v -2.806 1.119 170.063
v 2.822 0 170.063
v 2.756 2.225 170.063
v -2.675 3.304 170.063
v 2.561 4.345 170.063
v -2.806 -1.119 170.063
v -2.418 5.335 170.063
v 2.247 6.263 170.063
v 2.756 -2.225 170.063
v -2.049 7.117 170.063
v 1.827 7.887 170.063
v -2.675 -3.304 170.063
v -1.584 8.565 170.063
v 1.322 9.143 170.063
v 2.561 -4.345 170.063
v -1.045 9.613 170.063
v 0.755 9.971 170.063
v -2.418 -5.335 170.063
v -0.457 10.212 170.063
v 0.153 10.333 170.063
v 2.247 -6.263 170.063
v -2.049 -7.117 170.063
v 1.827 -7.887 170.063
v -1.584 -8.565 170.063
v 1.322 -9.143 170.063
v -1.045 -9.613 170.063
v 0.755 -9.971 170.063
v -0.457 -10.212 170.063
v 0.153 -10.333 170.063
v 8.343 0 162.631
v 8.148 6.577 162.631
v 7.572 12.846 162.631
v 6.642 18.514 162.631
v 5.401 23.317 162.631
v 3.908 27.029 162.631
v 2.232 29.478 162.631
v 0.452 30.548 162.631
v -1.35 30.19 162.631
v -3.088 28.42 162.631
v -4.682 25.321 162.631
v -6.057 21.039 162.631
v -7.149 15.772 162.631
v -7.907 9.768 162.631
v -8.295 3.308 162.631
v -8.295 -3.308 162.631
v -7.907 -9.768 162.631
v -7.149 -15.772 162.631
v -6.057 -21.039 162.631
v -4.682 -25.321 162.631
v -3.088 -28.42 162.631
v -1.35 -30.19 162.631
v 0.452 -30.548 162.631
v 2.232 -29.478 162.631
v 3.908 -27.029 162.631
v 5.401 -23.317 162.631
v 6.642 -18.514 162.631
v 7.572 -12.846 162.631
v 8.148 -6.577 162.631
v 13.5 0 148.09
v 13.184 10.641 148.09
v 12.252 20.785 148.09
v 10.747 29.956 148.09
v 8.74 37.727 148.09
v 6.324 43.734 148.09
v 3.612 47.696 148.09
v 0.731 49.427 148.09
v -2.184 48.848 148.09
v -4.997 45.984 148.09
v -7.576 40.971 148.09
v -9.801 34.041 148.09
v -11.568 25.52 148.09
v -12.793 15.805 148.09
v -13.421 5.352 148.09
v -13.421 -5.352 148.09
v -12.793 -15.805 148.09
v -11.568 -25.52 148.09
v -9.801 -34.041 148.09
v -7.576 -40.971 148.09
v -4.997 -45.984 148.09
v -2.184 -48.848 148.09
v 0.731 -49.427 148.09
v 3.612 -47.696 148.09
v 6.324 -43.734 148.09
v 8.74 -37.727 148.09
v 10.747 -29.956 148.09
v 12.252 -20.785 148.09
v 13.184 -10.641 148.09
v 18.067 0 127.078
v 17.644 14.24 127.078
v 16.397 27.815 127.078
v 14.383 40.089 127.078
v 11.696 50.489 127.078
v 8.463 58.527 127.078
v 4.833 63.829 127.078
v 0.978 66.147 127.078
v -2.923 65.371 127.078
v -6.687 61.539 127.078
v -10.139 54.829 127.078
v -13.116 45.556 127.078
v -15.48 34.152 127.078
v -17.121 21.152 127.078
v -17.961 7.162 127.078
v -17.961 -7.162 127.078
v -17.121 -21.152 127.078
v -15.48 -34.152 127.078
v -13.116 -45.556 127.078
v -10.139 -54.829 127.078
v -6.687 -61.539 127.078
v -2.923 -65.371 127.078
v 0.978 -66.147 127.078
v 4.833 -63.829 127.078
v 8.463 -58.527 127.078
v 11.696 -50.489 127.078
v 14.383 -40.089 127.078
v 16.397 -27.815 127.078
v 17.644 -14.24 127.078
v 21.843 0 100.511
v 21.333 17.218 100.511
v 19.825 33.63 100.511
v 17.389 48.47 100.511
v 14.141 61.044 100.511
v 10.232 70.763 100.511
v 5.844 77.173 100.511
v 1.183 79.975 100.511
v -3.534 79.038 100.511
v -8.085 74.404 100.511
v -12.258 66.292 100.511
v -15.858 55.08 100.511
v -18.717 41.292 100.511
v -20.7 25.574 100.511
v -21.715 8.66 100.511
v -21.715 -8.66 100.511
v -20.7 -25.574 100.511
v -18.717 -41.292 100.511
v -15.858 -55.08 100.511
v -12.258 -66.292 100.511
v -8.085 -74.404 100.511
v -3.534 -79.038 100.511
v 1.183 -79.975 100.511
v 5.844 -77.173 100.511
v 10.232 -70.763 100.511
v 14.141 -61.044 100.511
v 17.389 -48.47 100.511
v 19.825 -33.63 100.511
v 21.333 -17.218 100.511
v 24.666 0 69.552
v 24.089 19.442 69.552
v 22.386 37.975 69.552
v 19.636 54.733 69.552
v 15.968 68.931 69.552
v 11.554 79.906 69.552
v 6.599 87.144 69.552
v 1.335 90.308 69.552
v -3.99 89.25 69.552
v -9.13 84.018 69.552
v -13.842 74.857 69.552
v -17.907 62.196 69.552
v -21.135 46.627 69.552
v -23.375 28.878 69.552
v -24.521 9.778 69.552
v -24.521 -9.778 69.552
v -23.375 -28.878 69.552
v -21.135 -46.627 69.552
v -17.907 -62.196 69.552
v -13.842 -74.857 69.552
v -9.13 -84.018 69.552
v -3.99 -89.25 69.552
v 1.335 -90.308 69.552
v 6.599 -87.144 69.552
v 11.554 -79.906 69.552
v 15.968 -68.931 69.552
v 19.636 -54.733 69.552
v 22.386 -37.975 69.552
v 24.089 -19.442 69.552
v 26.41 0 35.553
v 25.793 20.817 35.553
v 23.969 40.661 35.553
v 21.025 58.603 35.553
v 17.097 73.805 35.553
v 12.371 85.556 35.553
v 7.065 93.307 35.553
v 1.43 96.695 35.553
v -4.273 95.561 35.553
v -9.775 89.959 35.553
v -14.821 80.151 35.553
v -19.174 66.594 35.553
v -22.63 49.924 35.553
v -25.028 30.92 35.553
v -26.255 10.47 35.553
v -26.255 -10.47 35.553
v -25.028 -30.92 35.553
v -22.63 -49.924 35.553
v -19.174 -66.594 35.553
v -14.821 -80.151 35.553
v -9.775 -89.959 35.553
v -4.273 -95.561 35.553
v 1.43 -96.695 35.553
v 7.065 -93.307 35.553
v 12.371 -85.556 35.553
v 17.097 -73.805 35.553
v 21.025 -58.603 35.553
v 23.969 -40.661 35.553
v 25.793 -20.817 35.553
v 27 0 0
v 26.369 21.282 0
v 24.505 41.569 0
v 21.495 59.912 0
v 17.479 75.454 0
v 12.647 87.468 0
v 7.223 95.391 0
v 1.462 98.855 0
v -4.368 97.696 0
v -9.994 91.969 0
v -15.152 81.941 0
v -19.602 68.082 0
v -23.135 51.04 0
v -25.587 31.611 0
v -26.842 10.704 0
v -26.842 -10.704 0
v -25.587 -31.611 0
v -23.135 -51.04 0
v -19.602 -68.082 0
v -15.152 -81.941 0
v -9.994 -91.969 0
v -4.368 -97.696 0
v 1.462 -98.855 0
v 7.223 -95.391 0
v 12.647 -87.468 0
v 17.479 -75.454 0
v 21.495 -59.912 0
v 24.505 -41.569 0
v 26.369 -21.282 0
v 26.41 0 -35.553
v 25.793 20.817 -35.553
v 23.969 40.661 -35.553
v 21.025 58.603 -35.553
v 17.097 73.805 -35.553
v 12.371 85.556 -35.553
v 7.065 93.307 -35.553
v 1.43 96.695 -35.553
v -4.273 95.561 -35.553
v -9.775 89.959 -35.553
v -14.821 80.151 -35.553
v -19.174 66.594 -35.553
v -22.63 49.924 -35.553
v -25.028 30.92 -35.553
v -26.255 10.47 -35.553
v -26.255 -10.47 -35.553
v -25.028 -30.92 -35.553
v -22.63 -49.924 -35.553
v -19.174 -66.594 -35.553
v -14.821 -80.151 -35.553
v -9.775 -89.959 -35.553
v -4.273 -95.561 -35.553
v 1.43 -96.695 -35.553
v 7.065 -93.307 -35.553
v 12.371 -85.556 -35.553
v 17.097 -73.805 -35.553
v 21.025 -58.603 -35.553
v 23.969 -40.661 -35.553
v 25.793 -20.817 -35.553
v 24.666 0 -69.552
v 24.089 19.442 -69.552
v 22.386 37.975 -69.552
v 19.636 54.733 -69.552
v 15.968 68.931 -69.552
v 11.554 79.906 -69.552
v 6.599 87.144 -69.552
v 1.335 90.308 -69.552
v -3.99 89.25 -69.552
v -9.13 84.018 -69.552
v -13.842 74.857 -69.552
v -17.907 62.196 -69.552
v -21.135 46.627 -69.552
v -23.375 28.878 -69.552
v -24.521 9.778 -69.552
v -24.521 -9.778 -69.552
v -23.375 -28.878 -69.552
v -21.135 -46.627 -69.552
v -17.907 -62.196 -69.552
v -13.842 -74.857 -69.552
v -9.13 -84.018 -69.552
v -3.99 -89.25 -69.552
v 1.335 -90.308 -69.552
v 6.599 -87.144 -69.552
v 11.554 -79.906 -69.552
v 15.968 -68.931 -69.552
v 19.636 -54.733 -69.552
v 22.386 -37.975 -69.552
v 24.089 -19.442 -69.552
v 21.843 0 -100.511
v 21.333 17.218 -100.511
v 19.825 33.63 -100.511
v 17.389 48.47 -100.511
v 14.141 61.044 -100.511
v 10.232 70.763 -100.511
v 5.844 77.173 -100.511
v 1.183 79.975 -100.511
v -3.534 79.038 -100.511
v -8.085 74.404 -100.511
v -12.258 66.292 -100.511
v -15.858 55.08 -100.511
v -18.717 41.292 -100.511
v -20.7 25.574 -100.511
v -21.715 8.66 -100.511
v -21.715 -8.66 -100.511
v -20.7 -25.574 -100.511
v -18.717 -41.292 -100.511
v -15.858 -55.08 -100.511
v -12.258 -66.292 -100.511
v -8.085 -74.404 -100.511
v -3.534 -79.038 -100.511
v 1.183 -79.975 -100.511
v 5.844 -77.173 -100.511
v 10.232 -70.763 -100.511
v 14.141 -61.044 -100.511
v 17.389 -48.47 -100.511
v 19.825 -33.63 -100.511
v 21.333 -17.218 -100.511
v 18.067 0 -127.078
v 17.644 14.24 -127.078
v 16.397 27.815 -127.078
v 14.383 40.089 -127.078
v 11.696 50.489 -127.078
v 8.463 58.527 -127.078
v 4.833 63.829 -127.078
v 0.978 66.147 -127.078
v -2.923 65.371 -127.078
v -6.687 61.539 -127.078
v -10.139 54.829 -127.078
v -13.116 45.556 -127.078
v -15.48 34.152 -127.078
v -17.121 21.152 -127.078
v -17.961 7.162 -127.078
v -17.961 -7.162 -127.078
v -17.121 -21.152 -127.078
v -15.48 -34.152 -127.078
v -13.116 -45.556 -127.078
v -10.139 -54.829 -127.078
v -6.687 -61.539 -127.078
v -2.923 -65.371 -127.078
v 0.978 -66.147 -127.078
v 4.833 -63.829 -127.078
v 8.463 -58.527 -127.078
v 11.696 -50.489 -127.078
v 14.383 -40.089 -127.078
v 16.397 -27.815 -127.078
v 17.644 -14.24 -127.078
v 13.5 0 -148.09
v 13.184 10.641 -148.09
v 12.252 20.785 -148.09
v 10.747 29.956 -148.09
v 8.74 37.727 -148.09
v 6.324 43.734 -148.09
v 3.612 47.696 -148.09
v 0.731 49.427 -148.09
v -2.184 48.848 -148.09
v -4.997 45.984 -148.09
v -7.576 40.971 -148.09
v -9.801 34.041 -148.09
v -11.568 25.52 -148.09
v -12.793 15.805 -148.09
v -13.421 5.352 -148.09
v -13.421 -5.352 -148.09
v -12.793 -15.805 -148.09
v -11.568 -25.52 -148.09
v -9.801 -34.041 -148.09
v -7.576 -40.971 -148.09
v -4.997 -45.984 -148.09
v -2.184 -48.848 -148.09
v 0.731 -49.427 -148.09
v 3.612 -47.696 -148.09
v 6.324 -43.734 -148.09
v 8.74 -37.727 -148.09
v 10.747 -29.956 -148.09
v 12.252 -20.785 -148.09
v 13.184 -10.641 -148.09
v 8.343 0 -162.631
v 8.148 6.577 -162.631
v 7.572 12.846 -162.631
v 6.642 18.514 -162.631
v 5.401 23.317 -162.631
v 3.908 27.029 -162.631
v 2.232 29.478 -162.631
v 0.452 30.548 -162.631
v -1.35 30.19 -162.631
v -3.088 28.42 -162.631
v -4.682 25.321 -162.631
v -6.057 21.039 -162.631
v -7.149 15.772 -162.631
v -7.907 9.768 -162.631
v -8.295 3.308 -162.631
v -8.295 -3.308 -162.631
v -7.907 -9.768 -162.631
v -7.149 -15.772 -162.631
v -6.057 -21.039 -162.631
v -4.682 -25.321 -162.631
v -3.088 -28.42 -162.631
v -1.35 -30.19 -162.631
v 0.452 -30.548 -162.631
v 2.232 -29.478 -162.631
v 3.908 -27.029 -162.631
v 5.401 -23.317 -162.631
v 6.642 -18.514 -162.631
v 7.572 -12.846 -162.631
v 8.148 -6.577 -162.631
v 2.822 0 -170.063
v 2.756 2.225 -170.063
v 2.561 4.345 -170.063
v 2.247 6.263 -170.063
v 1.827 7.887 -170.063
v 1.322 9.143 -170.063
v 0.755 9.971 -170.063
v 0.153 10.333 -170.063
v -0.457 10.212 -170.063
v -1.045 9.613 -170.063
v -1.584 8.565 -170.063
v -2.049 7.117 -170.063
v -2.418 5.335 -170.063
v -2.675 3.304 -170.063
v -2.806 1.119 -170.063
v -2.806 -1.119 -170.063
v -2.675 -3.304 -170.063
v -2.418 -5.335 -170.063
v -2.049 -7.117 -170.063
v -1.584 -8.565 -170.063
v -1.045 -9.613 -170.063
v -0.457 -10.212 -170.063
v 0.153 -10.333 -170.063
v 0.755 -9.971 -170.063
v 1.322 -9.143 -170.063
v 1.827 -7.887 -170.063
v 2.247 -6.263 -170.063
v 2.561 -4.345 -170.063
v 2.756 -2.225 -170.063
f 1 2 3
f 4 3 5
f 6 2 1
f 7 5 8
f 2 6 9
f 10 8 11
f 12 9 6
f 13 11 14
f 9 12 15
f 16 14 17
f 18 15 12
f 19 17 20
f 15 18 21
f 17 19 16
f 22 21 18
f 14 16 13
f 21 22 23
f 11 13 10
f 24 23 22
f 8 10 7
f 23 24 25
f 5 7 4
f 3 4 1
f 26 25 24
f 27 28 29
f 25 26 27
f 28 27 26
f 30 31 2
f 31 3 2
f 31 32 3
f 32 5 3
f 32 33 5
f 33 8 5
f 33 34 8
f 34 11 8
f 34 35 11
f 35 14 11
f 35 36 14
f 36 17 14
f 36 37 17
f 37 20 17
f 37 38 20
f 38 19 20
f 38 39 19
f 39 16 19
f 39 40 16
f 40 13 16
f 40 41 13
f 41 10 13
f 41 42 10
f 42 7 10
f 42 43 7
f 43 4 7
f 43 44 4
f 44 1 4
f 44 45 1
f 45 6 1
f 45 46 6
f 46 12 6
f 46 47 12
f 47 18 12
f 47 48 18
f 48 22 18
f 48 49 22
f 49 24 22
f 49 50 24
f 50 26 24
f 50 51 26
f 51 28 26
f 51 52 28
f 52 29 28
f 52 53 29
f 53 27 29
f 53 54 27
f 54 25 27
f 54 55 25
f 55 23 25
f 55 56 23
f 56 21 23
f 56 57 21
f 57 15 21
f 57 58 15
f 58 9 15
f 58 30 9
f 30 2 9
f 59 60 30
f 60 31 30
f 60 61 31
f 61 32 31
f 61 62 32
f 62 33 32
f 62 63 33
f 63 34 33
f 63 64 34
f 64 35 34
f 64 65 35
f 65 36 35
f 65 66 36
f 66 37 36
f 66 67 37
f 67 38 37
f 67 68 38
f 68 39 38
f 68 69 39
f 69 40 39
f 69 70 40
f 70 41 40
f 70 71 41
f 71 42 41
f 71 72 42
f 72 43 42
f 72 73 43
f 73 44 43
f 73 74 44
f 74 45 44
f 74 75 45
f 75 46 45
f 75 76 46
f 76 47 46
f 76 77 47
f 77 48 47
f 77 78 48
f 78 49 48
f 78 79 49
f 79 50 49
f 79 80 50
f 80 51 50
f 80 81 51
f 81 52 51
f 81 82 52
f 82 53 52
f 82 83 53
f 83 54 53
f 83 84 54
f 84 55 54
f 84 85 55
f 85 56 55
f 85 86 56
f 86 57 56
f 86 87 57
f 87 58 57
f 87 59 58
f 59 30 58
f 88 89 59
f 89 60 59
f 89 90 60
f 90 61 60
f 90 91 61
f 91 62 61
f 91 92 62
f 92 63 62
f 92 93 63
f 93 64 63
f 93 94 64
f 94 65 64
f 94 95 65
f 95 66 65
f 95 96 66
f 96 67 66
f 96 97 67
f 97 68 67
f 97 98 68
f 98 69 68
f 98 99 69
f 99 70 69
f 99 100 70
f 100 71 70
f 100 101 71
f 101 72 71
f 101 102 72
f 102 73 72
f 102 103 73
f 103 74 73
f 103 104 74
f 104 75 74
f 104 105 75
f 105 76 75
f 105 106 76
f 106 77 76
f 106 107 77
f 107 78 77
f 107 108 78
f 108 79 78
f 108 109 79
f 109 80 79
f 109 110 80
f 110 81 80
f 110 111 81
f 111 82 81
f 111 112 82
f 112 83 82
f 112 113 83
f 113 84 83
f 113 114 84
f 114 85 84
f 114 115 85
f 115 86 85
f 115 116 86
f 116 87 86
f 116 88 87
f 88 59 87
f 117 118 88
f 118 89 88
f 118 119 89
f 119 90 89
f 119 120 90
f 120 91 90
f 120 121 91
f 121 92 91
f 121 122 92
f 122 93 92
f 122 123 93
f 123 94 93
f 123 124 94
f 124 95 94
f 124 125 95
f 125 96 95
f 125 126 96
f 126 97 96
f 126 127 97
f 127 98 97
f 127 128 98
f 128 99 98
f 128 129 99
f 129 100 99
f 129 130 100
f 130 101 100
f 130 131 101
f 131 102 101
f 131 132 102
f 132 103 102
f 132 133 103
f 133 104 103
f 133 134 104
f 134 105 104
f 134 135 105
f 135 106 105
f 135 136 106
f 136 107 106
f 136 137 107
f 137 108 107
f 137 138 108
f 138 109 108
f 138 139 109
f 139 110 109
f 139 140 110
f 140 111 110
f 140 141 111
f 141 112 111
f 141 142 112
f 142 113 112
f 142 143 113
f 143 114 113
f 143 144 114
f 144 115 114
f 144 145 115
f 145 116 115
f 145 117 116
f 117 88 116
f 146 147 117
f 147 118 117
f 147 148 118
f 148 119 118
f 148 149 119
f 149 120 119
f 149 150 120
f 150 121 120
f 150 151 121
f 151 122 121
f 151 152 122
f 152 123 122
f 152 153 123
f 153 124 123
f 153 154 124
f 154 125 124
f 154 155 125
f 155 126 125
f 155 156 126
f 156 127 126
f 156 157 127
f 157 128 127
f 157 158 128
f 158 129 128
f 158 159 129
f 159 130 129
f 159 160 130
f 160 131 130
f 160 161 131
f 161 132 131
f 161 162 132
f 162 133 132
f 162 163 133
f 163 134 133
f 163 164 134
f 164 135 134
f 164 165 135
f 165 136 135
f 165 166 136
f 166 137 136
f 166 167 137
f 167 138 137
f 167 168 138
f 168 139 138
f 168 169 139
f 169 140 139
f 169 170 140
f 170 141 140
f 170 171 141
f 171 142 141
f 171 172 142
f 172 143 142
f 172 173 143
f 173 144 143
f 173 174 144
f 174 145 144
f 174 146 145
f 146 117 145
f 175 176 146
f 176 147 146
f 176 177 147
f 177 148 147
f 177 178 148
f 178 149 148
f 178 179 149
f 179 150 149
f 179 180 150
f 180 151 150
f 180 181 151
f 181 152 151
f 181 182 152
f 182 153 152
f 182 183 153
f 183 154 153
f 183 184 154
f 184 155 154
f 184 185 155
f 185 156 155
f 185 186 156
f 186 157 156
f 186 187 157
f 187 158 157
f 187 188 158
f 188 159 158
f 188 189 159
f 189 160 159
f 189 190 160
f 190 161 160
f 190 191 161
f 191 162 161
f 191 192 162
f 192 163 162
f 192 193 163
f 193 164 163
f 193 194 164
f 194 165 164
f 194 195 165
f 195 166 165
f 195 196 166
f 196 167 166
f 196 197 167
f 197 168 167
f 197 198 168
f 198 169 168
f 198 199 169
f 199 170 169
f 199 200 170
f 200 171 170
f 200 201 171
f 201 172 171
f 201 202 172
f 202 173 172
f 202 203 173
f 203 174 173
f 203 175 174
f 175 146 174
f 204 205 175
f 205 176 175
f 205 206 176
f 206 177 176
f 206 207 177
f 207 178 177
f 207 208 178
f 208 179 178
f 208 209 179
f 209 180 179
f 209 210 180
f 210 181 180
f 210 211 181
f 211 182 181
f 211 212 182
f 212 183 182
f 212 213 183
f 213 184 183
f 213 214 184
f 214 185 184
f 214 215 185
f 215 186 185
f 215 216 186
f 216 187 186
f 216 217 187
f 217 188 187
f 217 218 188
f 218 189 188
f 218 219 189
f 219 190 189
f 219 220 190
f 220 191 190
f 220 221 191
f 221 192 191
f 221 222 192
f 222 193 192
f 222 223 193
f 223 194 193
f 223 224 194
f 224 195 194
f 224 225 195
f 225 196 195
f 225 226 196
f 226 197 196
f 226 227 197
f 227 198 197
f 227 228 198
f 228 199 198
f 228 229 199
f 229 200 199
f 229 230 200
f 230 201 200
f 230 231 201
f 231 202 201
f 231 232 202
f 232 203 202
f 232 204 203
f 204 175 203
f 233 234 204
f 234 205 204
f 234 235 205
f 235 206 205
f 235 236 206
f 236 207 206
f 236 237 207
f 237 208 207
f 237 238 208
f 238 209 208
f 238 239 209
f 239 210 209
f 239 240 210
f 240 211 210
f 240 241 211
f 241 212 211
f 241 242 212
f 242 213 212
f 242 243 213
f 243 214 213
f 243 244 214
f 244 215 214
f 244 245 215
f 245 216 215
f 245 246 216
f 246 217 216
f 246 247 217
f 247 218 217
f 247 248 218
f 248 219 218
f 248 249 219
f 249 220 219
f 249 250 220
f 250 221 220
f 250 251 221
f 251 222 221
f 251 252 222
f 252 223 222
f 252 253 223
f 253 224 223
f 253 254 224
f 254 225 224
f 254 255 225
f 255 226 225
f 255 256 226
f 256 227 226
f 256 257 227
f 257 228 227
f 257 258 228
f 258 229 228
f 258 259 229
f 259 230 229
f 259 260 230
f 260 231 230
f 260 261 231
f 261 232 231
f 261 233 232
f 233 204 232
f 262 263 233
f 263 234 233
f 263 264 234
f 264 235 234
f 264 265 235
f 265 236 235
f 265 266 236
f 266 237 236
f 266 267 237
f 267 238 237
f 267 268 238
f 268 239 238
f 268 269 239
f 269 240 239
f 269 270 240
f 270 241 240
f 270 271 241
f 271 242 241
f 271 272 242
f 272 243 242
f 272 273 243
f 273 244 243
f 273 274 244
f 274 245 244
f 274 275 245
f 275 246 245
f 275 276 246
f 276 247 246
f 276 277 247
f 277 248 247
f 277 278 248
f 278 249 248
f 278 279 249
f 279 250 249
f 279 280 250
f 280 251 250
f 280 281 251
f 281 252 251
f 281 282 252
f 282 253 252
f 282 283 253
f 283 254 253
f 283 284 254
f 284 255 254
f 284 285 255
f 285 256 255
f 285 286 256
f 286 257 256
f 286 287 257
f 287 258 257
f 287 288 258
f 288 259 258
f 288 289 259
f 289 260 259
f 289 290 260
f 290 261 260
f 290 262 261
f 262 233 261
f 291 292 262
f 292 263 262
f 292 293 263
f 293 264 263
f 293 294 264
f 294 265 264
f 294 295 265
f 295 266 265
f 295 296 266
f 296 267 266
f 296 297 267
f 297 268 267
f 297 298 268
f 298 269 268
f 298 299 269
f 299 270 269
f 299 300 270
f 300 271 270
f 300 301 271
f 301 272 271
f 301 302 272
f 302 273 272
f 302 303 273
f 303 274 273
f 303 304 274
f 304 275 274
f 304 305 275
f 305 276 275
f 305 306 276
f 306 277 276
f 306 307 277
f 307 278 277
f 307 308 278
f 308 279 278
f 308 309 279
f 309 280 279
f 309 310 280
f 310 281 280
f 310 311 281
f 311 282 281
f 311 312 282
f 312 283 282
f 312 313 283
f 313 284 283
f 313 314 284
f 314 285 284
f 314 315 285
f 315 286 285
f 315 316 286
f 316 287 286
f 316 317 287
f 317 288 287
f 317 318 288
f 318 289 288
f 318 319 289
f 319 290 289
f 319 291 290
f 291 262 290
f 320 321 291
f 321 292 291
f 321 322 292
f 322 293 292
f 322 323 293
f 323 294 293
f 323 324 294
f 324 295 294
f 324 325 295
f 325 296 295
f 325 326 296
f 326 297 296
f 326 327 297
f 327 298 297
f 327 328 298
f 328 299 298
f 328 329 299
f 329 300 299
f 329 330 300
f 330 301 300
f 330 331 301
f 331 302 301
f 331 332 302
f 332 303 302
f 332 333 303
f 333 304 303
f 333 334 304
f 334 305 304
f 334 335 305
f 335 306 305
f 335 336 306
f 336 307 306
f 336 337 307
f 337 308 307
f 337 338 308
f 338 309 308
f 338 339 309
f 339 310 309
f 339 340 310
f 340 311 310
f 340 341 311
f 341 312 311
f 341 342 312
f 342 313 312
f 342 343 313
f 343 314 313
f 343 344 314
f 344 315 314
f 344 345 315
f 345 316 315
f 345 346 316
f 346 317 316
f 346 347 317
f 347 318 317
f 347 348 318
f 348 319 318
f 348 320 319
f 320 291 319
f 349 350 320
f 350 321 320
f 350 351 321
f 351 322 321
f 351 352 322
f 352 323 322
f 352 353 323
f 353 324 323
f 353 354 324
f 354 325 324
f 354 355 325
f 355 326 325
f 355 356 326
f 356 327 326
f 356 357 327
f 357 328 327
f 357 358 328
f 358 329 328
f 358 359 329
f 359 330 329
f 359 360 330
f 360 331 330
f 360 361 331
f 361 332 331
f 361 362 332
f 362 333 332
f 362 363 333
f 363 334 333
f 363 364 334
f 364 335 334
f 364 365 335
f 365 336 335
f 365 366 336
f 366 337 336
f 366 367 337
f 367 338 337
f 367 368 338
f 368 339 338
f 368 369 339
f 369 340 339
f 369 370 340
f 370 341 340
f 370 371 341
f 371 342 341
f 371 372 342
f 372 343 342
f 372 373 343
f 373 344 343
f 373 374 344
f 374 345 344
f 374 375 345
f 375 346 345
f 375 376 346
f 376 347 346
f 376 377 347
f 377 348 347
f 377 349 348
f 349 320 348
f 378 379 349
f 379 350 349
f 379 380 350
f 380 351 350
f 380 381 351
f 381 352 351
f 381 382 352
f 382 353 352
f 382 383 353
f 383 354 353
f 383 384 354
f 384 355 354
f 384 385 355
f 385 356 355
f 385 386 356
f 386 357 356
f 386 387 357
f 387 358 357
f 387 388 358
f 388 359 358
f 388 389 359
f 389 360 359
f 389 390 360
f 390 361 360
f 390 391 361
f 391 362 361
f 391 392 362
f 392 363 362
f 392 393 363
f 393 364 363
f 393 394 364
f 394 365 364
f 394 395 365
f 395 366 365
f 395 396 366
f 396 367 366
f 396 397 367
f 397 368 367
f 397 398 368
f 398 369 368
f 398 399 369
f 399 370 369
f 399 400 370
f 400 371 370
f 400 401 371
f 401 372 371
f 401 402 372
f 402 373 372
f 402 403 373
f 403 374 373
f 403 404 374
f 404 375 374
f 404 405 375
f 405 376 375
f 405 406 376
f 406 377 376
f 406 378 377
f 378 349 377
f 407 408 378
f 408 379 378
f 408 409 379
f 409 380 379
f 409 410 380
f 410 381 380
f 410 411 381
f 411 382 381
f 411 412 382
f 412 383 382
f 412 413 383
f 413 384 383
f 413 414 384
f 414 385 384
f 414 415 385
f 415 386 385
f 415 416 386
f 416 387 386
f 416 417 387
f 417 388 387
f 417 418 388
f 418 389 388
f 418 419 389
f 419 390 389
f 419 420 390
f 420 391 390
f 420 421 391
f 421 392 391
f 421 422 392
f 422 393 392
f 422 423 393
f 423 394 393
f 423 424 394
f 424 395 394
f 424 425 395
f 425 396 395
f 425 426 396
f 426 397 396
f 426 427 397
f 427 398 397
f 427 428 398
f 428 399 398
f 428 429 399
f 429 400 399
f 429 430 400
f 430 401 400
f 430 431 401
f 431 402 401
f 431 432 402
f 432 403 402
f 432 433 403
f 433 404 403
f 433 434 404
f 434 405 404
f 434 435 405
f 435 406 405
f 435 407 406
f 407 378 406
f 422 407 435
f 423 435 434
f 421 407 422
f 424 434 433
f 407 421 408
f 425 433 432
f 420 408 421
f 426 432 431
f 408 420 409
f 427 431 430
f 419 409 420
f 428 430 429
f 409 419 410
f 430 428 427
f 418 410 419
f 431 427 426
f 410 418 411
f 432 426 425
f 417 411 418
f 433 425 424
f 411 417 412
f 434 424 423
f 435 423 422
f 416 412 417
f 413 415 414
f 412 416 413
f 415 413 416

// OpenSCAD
// Generated by SolidPython 1.0.1 on 2020-07-29 00:46:45


scale(v = [3, 11, 19]) {
	sphere(r = 9);
}
/***********************************************
*********      SolidPython code:      **********
************************************************
 
# import packages: SolidPython
from solid import *
from solid.utils import *
from itertools import chain, combinations, permutations


class Resize:

    def __init__(self, scad_file):
        self.scad_file = scad_file
        #self.scad_file = import_scad(scad_file)
        # cone/cylinder param:
        self.r1 = 0
        self.r2 = 0
        self.h = 0
        # rectangular prism param:
        self.w = 0
        self.l = 0
        # ellipse param:
        self.r = 0

    # import OpenScad code (file name corresponds to shape)


    # classify shape + parameters
    def assign(self, param1, param2, param3):
        if self.scad_file == 'cone.scad':
            self.r1 = param1
            self.r2 = param2
            self.h = param3
        elif self.scad_file == 'cylinder.scad':
            self.r1 = param1
            self.r2 = param2
            self.h = param3
        elif self.scad_file == 'rectangularPrism.scad':
            self.h = param1
            self.l = param2
            self.w = param3
        else:
            self.r = param1
            self.h = param2

    # resize parameters
    def iterate(self):
        x = range(3, 20, 2)
        i = 1
        if self.scad_file == 'cone.scad':
            tempList = list(permutations(x, 2))
            for temp in tempList:
                param1 = temp[0]
                param2 = temp[1]
                filepath = 'produced_scad_files/' + 'cone' + str(param1) + '_' + str(param2) + '_' + '.scad'
                scad_render_to_file(cylinder(h=param1, r1=param2, r2=0), filepath)

        elif self.scad_file == 'cylinder.scad':
            tempList = list(permutations(x, 3))
            for temp in tempList:
                param1 = temp[0]
                param2 = temp[1]
                filepath = 'produced_scad_files/' + 'cylinder' + str(param1) + '_' + str(param2) + '_' + '.scad'
                scad_render_to_file(cylinder(h=param1, r1=param2, r2=param2), filepath)

        elif self.scad_file == 'rectangularPrism.scad':
            tempList = list(permutations(x, 3))
            for temp in tempList:
                param1 = temp[0]
                param2 = temp[1]
                param3 = temp[2]
                filepath = 'produced_scad_files/' + 'rectangularPrism' + str(param1) + '_' + str(param2) + '_' + str(
                    param3) + '.scad'
                scad_render_to_file(cube(size=(param1, param2, param3)), filepath)

        elif self.scad_file == 'ellipse.scad':
            tempList = list(permutations(x, 4))
            for temp in tempList:
                param1 = temp[0]
                param2 = temp[1]
                param3 = temp[2]
                param4 = temp[3]
                filepath = 'produced_scad_files/' + 'ellipse' + str(param1) + '_' + str(param2) + '_' + str(param3) + '_' + str(param4) + '.scad'
                scad_render_to_file(scale([param1, param2, param3])(sphere(r=param4)), filepath)

    def render_to_scadfile(self):
        scad_render_to_file(scad, 'example.scad') 
 
************************************************/
